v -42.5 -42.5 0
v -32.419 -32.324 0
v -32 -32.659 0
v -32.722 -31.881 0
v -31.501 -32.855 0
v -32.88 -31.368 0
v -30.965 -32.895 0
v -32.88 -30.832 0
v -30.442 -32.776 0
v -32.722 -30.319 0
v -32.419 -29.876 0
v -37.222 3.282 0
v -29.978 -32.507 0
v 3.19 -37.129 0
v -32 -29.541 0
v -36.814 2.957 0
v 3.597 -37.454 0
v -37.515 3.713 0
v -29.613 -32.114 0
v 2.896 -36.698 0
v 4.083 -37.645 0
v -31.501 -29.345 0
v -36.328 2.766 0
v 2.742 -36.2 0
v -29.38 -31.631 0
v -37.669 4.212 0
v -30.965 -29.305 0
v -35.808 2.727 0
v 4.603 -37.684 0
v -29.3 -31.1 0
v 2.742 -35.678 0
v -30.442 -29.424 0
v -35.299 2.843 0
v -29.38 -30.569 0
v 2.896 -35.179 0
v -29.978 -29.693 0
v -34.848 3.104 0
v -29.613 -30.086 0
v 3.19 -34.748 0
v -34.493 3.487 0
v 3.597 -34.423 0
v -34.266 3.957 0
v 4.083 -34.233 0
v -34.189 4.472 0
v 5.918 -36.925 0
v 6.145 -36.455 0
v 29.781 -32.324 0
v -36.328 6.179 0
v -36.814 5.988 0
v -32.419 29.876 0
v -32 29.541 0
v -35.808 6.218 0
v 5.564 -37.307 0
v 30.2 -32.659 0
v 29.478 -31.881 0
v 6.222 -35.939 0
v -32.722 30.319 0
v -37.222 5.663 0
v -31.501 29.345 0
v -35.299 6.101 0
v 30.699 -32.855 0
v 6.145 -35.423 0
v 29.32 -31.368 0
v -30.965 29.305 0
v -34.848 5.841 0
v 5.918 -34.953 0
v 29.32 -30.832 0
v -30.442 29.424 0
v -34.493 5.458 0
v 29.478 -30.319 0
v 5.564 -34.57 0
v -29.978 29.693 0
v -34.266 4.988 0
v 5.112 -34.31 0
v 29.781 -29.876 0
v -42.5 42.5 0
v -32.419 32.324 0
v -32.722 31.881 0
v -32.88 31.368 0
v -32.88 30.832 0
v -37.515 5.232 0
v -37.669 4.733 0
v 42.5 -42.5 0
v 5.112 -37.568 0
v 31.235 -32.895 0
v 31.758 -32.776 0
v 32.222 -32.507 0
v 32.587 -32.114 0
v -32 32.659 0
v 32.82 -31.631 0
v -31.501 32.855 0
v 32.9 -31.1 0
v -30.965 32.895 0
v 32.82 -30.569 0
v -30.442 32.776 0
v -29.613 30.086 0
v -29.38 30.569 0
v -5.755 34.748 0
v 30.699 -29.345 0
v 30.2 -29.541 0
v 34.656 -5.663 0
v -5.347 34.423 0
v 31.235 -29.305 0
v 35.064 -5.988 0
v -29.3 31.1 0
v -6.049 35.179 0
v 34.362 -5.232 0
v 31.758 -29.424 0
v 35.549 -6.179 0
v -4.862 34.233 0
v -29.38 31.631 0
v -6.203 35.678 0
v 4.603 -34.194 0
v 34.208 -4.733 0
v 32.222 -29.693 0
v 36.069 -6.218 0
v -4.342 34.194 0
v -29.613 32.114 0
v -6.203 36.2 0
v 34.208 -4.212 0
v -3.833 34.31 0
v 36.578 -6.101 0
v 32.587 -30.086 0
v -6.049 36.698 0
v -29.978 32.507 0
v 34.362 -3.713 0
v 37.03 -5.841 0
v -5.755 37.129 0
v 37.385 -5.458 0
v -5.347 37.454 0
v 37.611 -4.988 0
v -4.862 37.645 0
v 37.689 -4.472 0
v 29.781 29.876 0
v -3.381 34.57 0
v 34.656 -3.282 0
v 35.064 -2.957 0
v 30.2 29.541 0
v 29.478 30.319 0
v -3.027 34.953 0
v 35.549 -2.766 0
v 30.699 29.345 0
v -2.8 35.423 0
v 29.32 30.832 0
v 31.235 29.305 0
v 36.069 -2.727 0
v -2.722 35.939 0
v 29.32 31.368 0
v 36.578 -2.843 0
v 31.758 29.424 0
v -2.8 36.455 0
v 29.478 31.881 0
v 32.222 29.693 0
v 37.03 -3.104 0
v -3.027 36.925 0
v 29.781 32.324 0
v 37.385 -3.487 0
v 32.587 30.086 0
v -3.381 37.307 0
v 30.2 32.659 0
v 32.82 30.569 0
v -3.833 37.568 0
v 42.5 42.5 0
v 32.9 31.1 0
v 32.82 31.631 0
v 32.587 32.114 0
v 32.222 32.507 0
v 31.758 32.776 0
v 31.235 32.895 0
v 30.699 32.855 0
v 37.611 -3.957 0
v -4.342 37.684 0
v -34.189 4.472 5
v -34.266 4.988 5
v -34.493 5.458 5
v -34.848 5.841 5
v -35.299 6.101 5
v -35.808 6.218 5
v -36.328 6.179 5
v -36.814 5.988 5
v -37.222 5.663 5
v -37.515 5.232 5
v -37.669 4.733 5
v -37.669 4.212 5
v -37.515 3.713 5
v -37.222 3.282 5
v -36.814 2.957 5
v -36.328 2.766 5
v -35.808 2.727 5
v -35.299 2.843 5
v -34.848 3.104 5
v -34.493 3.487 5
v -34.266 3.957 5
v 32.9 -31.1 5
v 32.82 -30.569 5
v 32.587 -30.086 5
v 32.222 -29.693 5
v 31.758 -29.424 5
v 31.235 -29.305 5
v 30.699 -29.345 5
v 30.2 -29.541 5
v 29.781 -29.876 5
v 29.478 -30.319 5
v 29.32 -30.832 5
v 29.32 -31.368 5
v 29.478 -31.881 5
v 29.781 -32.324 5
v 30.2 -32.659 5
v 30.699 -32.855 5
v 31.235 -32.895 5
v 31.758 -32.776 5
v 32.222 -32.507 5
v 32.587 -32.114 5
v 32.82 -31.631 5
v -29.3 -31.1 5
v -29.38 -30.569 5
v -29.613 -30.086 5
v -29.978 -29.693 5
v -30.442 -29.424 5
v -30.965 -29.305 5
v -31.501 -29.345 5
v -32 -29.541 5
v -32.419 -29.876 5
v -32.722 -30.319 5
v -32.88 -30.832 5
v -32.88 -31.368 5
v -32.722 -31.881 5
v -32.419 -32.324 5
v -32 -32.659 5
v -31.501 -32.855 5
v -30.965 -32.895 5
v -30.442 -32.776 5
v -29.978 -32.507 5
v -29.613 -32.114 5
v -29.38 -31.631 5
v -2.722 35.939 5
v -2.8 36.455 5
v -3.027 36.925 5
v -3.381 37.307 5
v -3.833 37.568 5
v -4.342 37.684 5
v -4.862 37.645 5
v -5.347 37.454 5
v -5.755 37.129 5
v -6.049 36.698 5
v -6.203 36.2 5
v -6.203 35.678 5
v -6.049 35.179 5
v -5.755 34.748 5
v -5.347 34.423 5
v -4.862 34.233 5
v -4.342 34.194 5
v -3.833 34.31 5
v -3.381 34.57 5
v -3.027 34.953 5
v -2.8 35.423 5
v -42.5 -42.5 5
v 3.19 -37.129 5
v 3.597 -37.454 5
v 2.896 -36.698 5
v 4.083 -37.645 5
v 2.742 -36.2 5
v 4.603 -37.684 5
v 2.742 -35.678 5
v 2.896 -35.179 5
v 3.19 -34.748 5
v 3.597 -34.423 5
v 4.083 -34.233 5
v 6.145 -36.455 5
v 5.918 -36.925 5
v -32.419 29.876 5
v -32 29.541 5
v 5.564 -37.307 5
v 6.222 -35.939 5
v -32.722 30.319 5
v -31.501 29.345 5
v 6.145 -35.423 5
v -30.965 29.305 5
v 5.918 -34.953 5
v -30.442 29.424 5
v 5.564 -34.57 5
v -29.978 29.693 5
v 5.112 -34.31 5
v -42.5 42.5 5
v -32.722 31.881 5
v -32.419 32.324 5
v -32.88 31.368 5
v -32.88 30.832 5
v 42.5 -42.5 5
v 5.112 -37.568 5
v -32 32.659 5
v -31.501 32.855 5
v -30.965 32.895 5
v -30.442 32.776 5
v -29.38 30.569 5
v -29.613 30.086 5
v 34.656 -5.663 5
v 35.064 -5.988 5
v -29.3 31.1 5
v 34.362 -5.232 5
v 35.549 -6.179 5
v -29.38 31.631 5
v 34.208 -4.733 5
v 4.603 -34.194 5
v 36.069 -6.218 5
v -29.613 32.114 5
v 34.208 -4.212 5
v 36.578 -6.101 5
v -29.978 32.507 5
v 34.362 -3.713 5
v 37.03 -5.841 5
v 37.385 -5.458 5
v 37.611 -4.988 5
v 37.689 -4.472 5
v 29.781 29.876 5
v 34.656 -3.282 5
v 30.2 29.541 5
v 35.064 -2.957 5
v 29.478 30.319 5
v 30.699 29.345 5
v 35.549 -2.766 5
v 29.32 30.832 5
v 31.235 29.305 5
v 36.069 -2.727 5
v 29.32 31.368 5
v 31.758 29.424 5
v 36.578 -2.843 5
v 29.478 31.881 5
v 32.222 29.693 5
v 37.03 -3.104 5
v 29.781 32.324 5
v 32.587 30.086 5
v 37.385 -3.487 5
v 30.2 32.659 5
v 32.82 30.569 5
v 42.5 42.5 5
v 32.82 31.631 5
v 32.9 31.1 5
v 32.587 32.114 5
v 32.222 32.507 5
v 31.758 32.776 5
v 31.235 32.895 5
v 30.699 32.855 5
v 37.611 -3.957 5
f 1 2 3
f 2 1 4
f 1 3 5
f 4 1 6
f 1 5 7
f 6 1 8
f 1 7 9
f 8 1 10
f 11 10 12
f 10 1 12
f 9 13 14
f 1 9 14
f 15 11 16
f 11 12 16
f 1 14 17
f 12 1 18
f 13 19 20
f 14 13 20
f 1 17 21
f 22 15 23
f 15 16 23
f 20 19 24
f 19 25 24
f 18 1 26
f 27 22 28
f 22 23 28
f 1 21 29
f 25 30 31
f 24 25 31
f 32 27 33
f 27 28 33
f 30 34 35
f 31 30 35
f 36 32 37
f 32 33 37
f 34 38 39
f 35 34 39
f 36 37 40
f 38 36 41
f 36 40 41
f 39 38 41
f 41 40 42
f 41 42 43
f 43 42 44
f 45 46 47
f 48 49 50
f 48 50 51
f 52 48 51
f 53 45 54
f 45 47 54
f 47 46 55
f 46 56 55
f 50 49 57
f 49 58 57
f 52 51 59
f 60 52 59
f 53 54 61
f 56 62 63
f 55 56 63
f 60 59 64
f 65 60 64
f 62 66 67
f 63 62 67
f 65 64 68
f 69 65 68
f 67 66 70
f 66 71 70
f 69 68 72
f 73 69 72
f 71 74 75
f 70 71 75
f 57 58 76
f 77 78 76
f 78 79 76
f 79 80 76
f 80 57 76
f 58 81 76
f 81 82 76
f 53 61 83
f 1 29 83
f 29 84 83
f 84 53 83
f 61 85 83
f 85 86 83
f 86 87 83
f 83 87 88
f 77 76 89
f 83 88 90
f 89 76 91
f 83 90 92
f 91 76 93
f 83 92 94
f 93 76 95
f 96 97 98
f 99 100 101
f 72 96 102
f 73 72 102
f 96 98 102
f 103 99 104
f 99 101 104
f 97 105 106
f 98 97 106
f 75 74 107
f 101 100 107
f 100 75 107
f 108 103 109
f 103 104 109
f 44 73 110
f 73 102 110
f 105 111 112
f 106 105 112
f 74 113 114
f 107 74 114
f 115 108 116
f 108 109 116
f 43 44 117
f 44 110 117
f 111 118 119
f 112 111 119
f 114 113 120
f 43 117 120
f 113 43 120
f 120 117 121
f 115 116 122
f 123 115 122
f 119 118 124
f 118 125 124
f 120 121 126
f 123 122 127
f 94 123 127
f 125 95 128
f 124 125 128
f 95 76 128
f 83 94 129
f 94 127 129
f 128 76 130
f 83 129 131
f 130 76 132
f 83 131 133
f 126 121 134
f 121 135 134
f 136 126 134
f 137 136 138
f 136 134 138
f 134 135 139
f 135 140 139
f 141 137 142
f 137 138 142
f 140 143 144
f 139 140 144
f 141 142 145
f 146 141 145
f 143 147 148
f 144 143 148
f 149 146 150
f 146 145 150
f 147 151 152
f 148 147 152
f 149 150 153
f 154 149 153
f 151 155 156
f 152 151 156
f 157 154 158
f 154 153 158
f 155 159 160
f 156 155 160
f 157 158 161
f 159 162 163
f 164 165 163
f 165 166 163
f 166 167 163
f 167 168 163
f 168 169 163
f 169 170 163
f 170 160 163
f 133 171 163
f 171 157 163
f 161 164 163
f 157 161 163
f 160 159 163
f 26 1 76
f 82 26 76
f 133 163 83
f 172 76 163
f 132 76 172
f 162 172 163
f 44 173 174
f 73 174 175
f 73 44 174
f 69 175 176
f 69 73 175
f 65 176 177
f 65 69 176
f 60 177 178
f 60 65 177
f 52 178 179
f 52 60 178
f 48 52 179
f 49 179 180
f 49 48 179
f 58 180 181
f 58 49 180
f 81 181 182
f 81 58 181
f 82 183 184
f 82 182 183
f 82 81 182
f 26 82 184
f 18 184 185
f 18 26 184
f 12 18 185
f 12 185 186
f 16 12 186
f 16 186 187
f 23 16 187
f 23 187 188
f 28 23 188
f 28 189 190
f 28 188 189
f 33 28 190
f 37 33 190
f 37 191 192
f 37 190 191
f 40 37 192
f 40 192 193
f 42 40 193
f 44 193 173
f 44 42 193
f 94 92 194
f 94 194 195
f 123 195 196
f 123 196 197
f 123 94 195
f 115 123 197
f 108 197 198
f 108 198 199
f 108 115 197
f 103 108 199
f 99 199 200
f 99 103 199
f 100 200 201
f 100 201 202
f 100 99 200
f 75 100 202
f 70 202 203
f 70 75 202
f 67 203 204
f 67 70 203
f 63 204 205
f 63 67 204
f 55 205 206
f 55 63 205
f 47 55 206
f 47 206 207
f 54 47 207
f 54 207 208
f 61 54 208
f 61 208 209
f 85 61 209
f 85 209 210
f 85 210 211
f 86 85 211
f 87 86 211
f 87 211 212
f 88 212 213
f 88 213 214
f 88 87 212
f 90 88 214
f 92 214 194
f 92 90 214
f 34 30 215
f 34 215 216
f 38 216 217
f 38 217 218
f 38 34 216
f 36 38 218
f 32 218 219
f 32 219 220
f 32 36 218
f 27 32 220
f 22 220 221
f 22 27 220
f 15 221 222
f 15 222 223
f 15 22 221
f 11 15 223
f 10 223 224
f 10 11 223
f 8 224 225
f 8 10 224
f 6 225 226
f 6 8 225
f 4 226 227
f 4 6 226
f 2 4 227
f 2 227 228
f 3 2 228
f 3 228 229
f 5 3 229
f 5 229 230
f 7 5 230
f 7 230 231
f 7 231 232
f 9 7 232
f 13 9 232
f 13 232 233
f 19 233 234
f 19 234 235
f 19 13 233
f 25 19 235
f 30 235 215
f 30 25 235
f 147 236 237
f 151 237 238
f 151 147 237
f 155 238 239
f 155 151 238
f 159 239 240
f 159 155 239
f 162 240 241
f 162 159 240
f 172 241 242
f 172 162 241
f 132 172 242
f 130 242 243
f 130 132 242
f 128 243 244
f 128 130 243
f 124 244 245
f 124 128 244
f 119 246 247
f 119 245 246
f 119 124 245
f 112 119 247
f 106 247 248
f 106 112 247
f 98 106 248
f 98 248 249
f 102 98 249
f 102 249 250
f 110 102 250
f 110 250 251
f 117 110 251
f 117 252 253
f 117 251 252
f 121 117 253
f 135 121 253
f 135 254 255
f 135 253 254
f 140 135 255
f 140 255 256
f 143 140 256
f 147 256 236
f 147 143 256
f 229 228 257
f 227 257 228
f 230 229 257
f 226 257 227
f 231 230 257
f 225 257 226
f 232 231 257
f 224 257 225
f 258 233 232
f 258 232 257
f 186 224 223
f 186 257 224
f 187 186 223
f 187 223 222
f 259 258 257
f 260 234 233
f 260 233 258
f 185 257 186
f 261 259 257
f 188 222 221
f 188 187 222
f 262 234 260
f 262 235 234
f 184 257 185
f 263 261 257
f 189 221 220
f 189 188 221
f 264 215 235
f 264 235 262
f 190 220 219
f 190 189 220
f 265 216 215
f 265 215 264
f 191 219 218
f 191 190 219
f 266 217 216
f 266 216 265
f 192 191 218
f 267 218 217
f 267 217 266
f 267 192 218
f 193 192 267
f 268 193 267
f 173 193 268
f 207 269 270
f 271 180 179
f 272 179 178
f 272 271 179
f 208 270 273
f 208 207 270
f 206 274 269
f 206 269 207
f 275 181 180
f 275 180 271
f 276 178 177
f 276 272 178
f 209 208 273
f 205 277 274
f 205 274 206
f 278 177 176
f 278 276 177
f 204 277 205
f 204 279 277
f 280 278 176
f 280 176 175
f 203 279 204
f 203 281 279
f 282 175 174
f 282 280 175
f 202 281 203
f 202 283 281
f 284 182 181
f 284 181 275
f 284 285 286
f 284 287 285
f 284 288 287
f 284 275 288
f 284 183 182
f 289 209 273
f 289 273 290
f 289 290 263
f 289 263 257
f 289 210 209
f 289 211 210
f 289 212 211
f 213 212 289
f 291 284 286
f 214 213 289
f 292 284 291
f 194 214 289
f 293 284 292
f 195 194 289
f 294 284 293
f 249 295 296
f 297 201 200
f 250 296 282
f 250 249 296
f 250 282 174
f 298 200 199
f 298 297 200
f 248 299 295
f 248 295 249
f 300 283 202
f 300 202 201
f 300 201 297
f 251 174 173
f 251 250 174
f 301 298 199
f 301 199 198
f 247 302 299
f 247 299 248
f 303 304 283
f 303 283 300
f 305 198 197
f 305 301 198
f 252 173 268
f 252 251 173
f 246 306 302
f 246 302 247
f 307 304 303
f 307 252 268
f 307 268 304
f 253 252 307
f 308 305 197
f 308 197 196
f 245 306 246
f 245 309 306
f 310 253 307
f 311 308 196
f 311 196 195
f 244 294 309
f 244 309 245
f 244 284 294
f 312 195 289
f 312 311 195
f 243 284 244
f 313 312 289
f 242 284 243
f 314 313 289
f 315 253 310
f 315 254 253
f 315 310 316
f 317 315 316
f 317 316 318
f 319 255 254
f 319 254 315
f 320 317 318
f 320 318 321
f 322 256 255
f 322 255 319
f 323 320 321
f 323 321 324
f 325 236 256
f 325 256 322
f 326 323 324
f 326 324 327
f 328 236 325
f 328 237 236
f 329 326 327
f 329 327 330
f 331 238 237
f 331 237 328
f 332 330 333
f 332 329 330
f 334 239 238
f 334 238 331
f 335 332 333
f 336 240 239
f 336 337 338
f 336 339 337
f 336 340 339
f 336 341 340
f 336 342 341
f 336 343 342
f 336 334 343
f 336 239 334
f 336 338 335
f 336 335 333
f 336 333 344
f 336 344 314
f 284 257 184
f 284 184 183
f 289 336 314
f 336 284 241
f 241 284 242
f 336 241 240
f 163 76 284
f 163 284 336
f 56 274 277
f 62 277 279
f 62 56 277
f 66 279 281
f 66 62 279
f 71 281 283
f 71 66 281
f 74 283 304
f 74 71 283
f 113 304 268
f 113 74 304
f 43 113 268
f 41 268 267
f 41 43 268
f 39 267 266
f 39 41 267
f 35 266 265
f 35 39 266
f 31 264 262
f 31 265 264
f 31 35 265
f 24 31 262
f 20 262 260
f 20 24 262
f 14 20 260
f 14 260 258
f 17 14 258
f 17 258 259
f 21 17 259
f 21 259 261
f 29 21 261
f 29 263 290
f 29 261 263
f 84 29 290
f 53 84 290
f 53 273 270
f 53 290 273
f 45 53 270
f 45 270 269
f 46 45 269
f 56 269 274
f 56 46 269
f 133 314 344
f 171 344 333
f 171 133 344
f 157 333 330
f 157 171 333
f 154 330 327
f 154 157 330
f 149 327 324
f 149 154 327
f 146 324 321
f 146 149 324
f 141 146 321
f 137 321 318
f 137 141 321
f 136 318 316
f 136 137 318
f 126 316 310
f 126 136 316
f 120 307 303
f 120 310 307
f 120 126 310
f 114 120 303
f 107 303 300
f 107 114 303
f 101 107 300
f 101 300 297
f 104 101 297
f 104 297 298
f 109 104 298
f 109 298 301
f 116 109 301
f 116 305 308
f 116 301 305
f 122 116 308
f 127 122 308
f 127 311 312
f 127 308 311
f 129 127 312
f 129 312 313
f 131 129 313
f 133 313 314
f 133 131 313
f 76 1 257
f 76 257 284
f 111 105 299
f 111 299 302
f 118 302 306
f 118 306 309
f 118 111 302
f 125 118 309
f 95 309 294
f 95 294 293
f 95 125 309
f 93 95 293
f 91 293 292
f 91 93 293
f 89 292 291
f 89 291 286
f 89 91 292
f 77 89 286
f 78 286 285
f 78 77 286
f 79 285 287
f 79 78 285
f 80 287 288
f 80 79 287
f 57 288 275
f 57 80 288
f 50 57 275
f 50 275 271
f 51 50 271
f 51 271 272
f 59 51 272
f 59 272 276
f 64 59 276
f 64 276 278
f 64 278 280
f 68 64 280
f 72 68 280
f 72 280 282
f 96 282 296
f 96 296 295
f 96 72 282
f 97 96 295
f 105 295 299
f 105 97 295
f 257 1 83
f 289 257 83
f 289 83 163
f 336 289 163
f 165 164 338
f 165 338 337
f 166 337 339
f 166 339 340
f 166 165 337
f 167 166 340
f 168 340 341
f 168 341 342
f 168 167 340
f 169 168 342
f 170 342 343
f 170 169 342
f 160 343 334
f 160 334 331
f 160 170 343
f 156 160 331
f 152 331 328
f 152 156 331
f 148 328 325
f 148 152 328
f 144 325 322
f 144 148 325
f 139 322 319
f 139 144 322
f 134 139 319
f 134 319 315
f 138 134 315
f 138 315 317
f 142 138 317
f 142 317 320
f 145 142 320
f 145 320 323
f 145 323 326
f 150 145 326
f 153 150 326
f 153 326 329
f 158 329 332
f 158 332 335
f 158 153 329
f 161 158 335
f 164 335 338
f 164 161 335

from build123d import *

# Parameters (mm, degrees)
F0_W     = 85
F0_H     = 85
F0_R     = 1.8
F2_DEPTH = 5
F1_R     = 1.75
F3_DEPTH = 10


with BuildPart() as f2:
    # F0 (on Top) → F2 (new body)
    with BuildSketch(Plane.XY):
        Rectangle(F0_W, F0_H)
        with Locations((-31.1, -31.1)):
            Circle(F0_R, mode=Mode.SUBTRACT)
        with Locations((31.1, -31.1)):
            Circle(F0_R, mode=Mode.SUBTRACT)
        with Locations((-31.1, 31.1)):
            Circle(F0_R, mode=Mode.SUBTRACT)
        with Locations((31.1, 31.1)):
            Circle(F0_R, mode=Mode.SUBTRACT)
    extrude(amount=F2_DEPTH)

    # F1 (on face) → F3 (cut)
    with BuildSketch(Plane.XY):
        with Locations((-4.47245, 35.938702)):
            Circle(F1_R)
        with Locations((35.938702, -4.47245)):
            Circle(F1_R)
        with Locations((4.47245, -35.938702)):
            Circle(F1_R)
        with Locations((-35.938702, 4.47245)):
            Circle(F1_R)
    extrude(amount=F3_DEPTH, mode=Mode.SUBTRACT)


solid = f2.part
